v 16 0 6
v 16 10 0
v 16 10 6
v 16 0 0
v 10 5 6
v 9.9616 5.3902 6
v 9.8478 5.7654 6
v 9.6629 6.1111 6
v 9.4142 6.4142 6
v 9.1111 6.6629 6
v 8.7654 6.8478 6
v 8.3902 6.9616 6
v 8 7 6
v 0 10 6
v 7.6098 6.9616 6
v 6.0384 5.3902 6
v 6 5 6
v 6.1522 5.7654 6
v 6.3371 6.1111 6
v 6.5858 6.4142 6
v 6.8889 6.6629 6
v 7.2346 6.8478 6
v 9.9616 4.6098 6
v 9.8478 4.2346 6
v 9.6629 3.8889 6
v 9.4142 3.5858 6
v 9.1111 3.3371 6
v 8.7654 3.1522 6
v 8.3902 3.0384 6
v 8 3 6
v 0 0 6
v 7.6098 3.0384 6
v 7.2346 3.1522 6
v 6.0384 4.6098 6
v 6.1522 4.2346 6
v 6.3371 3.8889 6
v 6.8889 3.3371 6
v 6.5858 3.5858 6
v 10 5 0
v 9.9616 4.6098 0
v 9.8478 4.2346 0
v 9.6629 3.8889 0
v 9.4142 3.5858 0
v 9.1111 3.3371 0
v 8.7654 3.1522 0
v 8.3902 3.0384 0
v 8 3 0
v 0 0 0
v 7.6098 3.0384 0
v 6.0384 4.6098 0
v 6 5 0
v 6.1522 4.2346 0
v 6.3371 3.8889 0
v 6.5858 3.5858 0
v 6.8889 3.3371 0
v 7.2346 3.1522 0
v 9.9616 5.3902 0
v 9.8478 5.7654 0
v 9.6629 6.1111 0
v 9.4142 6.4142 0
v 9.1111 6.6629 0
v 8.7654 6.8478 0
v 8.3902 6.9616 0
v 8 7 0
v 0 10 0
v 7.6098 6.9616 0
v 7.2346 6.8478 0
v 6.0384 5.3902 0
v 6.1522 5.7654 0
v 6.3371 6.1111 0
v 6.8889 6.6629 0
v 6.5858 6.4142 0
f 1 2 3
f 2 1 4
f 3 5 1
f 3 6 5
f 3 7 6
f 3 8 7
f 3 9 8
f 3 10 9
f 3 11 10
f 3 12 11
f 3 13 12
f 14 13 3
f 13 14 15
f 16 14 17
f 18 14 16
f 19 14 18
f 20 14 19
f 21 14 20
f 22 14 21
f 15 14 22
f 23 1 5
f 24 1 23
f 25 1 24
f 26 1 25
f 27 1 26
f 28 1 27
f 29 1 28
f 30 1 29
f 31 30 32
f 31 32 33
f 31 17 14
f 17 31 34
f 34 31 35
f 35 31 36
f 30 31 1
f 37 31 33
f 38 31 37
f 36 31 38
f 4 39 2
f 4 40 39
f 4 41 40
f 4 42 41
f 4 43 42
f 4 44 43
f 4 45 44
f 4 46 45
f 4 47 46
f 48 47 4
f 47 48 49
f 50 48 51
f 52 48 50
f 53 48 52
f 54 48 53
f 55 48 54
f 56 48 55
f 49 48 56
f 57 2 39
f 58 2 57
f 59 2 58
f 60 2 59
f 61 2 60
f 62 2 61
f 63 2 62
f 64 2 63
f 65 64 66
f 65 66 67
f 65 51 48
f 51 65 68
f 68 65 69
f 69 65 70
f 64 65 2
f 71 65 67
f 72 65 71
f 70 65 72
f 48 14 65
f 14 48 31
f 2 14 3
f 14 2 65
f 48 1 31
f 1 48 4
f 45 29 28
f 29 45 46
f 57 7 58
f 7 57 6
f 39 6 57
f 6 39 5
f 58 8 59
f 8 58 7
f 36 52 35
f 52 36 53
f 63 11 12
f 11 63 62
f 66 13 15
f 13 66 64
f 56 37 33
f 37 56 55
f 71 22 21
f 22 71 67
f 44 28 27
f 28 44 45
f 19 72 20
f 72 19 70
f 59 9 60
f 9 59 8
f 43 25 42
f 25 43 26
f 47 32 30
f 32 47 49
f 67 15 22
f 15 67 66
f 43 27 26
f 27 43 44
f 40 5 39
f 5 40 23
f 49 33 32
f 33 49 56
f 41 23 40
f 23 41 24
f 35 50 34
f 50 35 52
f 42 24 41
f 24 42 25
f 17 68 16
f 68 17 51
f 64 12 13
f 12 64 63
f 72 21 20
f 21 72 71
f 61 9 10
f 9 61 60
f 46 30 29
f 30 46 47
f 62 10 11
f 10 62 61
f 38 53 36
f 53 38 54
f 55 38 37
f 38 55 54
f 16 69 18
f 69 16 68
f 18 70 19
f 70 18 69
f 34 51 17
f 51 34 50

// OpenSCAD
$fn = 32;

// ----------------------------------------------------------------------
// Micro pad: drilled pad, 5-20 mm class
// ----------------------------------------------------------------------

// --- parameters (mm) ---
pad_l = 16;               // pad length, X
pad_w = 10;               // pad width, Y
pad_t = 6;                // pad thickness, Z
hole_d = 4;               // through hole diameter

difference() {
  cube([pad_l, pad_w, pad_t]);
  translate([pad_l / 2, pad_w / 2, -1])
    cylinder(h = pad_t + 2, d = hole_d);
}
